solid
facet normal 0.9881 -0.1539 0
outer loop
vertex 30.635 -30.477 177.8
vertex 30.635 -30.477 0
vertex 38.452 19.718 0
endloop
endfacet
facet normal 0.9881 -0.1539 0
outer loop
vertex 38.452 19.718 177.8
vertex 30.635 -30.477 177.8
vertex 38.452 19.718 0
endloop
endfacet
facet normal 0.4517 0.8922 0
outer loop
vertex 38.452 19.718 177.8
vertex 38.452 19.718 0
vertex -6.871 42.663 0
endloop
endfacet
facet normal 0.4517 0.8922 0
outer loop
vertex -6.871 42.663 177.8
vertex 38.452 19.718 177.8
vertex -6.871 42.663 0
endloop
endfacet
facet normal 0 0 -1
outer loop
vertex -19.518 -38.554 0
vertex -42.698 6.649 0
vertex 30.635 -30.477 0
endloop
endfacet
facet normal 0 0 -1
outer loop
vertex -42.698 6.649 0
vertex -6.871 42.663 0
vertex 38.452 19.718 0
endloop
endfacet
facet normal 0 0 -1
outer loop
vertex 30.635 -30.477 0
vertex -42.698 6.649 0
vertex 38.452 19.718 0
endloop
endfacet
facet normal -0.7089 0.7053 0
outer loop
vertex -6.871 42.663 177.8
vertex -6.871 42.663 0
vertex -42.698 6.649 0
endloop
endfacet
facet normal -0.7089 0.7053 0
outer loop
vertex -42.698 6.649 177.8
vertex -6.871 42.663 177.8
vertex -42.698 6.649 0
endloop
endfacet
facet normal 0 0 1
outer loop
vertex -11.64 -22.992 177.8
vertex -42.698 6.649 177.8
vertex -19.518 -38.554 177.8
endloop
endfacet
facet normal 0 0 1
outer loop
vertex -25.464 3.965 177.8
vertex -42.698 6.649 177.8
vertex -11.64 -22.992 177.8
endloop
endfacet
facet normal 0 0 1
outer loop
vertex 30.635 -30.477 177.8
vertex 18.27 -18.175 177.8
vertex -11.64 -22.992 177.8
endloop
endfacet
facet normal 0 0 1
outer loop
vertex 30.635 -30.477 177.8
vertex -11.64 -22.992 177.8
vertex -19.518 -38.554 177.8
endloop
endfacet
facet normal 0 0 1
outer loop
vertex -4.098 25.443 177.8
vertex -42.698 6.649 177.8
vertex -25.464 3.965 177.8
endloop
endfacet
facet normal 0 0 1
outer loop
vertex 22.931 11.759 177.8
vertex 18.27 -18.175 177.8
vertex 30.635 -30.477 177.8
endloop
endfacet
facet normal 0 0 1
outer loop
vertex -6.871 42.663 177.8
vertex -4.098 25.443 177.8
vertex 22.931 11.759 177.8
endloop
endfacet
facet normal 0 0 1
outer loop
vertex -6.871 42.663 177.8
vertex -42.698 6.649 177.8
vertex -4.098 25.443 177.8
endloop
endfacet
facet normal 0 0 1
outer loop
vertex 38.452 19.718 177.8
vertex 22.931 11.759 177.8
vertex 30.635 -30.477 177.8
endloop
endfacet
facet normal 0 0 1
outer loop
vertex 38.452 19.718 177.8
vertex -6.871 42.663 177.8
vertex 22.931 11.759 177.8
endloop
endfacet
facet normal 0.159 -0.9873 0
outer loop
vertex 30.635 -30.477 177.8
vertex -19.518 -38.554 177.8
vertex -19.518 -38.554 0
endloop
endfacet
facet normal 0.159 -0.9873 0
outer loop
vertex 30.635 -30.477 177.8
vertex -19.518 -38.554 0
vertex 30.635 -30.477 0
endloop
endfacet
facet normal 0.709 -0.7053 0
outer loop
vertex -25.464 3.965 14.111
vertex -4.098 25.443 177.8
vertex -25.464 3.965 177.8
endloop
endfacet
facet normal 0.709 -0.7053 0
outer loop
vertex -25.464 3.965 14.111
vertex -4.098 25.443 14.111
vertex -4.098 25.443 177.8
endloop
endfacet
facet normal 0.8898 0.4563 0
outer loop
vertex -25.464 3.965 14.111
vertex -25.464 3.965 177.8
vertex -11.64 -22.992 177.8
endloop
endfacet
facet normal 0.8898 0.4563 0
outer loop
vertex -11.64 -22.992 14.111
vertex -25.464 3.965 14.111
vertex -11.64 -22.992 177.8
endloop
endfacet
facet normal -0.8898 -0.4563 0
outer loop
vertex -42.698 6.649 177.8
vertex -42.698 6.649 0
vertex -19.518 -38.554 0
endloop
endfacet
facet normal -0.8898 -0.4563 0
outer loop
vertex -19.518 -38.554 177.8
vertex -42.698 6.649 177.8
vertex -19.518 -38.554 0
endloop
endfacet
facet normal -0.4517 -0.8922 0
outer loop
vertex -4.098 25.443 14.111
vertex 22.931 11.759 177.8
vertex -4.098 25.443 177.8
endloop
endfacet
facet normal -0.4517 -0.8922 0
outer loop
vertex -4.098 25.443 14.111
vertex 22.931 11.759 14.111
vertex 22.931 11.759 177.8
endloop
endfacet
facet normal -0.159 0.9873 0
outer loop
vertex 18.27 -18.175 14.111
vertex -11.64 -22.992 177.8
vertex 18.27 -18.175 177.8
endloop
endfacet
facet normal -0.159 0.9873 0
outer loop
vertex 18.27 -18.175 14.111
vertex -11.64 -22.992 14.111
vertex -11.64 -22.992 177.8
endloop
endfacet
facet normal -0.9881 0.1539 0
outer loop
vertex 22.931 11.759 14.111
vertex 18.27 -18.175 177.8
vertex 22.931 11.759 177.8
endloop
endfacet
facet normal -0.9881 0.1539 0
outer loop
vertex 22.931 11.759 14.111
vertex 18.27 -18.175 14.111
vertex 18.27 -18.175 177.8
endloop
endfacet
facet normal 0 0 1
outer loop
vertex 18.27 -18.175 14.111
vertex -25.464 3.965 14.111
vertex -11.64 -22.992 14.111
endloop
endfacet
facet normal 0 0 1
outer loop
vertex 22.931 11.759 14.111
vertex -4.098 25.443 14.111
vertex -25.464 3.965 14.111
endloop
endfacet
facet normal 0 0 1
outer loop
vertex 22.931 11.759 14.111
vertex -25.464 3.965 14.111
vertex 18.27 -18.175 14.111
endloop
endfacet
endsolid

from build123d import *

# Parameters (mm, degrees)
F1_DEPTH = 177.8
F2_T     = -14.1111111111


# Not quite as in the source:
# - a length typed as a fraction of an inch, garbled in the dataset ("3 / 203.2 mm" for 3/8 in), is restored


with BuildPart() as f1:
    # F0 (on Top) → F1 (new body)
    with BuildSketch(Plane.XY):
        Polygon((-6.8708224943, 42.663338416), (-42.6984469235, 6.6491561018), (-19.5182689713, -38.5539339486), (30.6354932977, -30.4767976821), (38.4520450914, 19.7182371128), align=None)
    extrude(amount=F1_DEPTH)

    # F2
    f2_openings = [f1.faces().sort_by_distance(p)[0] for p in [
        (0, 0, 177.8),
    ]]
    offset(amount=F2_T, openings=f2_openings)


solid = f1.part
